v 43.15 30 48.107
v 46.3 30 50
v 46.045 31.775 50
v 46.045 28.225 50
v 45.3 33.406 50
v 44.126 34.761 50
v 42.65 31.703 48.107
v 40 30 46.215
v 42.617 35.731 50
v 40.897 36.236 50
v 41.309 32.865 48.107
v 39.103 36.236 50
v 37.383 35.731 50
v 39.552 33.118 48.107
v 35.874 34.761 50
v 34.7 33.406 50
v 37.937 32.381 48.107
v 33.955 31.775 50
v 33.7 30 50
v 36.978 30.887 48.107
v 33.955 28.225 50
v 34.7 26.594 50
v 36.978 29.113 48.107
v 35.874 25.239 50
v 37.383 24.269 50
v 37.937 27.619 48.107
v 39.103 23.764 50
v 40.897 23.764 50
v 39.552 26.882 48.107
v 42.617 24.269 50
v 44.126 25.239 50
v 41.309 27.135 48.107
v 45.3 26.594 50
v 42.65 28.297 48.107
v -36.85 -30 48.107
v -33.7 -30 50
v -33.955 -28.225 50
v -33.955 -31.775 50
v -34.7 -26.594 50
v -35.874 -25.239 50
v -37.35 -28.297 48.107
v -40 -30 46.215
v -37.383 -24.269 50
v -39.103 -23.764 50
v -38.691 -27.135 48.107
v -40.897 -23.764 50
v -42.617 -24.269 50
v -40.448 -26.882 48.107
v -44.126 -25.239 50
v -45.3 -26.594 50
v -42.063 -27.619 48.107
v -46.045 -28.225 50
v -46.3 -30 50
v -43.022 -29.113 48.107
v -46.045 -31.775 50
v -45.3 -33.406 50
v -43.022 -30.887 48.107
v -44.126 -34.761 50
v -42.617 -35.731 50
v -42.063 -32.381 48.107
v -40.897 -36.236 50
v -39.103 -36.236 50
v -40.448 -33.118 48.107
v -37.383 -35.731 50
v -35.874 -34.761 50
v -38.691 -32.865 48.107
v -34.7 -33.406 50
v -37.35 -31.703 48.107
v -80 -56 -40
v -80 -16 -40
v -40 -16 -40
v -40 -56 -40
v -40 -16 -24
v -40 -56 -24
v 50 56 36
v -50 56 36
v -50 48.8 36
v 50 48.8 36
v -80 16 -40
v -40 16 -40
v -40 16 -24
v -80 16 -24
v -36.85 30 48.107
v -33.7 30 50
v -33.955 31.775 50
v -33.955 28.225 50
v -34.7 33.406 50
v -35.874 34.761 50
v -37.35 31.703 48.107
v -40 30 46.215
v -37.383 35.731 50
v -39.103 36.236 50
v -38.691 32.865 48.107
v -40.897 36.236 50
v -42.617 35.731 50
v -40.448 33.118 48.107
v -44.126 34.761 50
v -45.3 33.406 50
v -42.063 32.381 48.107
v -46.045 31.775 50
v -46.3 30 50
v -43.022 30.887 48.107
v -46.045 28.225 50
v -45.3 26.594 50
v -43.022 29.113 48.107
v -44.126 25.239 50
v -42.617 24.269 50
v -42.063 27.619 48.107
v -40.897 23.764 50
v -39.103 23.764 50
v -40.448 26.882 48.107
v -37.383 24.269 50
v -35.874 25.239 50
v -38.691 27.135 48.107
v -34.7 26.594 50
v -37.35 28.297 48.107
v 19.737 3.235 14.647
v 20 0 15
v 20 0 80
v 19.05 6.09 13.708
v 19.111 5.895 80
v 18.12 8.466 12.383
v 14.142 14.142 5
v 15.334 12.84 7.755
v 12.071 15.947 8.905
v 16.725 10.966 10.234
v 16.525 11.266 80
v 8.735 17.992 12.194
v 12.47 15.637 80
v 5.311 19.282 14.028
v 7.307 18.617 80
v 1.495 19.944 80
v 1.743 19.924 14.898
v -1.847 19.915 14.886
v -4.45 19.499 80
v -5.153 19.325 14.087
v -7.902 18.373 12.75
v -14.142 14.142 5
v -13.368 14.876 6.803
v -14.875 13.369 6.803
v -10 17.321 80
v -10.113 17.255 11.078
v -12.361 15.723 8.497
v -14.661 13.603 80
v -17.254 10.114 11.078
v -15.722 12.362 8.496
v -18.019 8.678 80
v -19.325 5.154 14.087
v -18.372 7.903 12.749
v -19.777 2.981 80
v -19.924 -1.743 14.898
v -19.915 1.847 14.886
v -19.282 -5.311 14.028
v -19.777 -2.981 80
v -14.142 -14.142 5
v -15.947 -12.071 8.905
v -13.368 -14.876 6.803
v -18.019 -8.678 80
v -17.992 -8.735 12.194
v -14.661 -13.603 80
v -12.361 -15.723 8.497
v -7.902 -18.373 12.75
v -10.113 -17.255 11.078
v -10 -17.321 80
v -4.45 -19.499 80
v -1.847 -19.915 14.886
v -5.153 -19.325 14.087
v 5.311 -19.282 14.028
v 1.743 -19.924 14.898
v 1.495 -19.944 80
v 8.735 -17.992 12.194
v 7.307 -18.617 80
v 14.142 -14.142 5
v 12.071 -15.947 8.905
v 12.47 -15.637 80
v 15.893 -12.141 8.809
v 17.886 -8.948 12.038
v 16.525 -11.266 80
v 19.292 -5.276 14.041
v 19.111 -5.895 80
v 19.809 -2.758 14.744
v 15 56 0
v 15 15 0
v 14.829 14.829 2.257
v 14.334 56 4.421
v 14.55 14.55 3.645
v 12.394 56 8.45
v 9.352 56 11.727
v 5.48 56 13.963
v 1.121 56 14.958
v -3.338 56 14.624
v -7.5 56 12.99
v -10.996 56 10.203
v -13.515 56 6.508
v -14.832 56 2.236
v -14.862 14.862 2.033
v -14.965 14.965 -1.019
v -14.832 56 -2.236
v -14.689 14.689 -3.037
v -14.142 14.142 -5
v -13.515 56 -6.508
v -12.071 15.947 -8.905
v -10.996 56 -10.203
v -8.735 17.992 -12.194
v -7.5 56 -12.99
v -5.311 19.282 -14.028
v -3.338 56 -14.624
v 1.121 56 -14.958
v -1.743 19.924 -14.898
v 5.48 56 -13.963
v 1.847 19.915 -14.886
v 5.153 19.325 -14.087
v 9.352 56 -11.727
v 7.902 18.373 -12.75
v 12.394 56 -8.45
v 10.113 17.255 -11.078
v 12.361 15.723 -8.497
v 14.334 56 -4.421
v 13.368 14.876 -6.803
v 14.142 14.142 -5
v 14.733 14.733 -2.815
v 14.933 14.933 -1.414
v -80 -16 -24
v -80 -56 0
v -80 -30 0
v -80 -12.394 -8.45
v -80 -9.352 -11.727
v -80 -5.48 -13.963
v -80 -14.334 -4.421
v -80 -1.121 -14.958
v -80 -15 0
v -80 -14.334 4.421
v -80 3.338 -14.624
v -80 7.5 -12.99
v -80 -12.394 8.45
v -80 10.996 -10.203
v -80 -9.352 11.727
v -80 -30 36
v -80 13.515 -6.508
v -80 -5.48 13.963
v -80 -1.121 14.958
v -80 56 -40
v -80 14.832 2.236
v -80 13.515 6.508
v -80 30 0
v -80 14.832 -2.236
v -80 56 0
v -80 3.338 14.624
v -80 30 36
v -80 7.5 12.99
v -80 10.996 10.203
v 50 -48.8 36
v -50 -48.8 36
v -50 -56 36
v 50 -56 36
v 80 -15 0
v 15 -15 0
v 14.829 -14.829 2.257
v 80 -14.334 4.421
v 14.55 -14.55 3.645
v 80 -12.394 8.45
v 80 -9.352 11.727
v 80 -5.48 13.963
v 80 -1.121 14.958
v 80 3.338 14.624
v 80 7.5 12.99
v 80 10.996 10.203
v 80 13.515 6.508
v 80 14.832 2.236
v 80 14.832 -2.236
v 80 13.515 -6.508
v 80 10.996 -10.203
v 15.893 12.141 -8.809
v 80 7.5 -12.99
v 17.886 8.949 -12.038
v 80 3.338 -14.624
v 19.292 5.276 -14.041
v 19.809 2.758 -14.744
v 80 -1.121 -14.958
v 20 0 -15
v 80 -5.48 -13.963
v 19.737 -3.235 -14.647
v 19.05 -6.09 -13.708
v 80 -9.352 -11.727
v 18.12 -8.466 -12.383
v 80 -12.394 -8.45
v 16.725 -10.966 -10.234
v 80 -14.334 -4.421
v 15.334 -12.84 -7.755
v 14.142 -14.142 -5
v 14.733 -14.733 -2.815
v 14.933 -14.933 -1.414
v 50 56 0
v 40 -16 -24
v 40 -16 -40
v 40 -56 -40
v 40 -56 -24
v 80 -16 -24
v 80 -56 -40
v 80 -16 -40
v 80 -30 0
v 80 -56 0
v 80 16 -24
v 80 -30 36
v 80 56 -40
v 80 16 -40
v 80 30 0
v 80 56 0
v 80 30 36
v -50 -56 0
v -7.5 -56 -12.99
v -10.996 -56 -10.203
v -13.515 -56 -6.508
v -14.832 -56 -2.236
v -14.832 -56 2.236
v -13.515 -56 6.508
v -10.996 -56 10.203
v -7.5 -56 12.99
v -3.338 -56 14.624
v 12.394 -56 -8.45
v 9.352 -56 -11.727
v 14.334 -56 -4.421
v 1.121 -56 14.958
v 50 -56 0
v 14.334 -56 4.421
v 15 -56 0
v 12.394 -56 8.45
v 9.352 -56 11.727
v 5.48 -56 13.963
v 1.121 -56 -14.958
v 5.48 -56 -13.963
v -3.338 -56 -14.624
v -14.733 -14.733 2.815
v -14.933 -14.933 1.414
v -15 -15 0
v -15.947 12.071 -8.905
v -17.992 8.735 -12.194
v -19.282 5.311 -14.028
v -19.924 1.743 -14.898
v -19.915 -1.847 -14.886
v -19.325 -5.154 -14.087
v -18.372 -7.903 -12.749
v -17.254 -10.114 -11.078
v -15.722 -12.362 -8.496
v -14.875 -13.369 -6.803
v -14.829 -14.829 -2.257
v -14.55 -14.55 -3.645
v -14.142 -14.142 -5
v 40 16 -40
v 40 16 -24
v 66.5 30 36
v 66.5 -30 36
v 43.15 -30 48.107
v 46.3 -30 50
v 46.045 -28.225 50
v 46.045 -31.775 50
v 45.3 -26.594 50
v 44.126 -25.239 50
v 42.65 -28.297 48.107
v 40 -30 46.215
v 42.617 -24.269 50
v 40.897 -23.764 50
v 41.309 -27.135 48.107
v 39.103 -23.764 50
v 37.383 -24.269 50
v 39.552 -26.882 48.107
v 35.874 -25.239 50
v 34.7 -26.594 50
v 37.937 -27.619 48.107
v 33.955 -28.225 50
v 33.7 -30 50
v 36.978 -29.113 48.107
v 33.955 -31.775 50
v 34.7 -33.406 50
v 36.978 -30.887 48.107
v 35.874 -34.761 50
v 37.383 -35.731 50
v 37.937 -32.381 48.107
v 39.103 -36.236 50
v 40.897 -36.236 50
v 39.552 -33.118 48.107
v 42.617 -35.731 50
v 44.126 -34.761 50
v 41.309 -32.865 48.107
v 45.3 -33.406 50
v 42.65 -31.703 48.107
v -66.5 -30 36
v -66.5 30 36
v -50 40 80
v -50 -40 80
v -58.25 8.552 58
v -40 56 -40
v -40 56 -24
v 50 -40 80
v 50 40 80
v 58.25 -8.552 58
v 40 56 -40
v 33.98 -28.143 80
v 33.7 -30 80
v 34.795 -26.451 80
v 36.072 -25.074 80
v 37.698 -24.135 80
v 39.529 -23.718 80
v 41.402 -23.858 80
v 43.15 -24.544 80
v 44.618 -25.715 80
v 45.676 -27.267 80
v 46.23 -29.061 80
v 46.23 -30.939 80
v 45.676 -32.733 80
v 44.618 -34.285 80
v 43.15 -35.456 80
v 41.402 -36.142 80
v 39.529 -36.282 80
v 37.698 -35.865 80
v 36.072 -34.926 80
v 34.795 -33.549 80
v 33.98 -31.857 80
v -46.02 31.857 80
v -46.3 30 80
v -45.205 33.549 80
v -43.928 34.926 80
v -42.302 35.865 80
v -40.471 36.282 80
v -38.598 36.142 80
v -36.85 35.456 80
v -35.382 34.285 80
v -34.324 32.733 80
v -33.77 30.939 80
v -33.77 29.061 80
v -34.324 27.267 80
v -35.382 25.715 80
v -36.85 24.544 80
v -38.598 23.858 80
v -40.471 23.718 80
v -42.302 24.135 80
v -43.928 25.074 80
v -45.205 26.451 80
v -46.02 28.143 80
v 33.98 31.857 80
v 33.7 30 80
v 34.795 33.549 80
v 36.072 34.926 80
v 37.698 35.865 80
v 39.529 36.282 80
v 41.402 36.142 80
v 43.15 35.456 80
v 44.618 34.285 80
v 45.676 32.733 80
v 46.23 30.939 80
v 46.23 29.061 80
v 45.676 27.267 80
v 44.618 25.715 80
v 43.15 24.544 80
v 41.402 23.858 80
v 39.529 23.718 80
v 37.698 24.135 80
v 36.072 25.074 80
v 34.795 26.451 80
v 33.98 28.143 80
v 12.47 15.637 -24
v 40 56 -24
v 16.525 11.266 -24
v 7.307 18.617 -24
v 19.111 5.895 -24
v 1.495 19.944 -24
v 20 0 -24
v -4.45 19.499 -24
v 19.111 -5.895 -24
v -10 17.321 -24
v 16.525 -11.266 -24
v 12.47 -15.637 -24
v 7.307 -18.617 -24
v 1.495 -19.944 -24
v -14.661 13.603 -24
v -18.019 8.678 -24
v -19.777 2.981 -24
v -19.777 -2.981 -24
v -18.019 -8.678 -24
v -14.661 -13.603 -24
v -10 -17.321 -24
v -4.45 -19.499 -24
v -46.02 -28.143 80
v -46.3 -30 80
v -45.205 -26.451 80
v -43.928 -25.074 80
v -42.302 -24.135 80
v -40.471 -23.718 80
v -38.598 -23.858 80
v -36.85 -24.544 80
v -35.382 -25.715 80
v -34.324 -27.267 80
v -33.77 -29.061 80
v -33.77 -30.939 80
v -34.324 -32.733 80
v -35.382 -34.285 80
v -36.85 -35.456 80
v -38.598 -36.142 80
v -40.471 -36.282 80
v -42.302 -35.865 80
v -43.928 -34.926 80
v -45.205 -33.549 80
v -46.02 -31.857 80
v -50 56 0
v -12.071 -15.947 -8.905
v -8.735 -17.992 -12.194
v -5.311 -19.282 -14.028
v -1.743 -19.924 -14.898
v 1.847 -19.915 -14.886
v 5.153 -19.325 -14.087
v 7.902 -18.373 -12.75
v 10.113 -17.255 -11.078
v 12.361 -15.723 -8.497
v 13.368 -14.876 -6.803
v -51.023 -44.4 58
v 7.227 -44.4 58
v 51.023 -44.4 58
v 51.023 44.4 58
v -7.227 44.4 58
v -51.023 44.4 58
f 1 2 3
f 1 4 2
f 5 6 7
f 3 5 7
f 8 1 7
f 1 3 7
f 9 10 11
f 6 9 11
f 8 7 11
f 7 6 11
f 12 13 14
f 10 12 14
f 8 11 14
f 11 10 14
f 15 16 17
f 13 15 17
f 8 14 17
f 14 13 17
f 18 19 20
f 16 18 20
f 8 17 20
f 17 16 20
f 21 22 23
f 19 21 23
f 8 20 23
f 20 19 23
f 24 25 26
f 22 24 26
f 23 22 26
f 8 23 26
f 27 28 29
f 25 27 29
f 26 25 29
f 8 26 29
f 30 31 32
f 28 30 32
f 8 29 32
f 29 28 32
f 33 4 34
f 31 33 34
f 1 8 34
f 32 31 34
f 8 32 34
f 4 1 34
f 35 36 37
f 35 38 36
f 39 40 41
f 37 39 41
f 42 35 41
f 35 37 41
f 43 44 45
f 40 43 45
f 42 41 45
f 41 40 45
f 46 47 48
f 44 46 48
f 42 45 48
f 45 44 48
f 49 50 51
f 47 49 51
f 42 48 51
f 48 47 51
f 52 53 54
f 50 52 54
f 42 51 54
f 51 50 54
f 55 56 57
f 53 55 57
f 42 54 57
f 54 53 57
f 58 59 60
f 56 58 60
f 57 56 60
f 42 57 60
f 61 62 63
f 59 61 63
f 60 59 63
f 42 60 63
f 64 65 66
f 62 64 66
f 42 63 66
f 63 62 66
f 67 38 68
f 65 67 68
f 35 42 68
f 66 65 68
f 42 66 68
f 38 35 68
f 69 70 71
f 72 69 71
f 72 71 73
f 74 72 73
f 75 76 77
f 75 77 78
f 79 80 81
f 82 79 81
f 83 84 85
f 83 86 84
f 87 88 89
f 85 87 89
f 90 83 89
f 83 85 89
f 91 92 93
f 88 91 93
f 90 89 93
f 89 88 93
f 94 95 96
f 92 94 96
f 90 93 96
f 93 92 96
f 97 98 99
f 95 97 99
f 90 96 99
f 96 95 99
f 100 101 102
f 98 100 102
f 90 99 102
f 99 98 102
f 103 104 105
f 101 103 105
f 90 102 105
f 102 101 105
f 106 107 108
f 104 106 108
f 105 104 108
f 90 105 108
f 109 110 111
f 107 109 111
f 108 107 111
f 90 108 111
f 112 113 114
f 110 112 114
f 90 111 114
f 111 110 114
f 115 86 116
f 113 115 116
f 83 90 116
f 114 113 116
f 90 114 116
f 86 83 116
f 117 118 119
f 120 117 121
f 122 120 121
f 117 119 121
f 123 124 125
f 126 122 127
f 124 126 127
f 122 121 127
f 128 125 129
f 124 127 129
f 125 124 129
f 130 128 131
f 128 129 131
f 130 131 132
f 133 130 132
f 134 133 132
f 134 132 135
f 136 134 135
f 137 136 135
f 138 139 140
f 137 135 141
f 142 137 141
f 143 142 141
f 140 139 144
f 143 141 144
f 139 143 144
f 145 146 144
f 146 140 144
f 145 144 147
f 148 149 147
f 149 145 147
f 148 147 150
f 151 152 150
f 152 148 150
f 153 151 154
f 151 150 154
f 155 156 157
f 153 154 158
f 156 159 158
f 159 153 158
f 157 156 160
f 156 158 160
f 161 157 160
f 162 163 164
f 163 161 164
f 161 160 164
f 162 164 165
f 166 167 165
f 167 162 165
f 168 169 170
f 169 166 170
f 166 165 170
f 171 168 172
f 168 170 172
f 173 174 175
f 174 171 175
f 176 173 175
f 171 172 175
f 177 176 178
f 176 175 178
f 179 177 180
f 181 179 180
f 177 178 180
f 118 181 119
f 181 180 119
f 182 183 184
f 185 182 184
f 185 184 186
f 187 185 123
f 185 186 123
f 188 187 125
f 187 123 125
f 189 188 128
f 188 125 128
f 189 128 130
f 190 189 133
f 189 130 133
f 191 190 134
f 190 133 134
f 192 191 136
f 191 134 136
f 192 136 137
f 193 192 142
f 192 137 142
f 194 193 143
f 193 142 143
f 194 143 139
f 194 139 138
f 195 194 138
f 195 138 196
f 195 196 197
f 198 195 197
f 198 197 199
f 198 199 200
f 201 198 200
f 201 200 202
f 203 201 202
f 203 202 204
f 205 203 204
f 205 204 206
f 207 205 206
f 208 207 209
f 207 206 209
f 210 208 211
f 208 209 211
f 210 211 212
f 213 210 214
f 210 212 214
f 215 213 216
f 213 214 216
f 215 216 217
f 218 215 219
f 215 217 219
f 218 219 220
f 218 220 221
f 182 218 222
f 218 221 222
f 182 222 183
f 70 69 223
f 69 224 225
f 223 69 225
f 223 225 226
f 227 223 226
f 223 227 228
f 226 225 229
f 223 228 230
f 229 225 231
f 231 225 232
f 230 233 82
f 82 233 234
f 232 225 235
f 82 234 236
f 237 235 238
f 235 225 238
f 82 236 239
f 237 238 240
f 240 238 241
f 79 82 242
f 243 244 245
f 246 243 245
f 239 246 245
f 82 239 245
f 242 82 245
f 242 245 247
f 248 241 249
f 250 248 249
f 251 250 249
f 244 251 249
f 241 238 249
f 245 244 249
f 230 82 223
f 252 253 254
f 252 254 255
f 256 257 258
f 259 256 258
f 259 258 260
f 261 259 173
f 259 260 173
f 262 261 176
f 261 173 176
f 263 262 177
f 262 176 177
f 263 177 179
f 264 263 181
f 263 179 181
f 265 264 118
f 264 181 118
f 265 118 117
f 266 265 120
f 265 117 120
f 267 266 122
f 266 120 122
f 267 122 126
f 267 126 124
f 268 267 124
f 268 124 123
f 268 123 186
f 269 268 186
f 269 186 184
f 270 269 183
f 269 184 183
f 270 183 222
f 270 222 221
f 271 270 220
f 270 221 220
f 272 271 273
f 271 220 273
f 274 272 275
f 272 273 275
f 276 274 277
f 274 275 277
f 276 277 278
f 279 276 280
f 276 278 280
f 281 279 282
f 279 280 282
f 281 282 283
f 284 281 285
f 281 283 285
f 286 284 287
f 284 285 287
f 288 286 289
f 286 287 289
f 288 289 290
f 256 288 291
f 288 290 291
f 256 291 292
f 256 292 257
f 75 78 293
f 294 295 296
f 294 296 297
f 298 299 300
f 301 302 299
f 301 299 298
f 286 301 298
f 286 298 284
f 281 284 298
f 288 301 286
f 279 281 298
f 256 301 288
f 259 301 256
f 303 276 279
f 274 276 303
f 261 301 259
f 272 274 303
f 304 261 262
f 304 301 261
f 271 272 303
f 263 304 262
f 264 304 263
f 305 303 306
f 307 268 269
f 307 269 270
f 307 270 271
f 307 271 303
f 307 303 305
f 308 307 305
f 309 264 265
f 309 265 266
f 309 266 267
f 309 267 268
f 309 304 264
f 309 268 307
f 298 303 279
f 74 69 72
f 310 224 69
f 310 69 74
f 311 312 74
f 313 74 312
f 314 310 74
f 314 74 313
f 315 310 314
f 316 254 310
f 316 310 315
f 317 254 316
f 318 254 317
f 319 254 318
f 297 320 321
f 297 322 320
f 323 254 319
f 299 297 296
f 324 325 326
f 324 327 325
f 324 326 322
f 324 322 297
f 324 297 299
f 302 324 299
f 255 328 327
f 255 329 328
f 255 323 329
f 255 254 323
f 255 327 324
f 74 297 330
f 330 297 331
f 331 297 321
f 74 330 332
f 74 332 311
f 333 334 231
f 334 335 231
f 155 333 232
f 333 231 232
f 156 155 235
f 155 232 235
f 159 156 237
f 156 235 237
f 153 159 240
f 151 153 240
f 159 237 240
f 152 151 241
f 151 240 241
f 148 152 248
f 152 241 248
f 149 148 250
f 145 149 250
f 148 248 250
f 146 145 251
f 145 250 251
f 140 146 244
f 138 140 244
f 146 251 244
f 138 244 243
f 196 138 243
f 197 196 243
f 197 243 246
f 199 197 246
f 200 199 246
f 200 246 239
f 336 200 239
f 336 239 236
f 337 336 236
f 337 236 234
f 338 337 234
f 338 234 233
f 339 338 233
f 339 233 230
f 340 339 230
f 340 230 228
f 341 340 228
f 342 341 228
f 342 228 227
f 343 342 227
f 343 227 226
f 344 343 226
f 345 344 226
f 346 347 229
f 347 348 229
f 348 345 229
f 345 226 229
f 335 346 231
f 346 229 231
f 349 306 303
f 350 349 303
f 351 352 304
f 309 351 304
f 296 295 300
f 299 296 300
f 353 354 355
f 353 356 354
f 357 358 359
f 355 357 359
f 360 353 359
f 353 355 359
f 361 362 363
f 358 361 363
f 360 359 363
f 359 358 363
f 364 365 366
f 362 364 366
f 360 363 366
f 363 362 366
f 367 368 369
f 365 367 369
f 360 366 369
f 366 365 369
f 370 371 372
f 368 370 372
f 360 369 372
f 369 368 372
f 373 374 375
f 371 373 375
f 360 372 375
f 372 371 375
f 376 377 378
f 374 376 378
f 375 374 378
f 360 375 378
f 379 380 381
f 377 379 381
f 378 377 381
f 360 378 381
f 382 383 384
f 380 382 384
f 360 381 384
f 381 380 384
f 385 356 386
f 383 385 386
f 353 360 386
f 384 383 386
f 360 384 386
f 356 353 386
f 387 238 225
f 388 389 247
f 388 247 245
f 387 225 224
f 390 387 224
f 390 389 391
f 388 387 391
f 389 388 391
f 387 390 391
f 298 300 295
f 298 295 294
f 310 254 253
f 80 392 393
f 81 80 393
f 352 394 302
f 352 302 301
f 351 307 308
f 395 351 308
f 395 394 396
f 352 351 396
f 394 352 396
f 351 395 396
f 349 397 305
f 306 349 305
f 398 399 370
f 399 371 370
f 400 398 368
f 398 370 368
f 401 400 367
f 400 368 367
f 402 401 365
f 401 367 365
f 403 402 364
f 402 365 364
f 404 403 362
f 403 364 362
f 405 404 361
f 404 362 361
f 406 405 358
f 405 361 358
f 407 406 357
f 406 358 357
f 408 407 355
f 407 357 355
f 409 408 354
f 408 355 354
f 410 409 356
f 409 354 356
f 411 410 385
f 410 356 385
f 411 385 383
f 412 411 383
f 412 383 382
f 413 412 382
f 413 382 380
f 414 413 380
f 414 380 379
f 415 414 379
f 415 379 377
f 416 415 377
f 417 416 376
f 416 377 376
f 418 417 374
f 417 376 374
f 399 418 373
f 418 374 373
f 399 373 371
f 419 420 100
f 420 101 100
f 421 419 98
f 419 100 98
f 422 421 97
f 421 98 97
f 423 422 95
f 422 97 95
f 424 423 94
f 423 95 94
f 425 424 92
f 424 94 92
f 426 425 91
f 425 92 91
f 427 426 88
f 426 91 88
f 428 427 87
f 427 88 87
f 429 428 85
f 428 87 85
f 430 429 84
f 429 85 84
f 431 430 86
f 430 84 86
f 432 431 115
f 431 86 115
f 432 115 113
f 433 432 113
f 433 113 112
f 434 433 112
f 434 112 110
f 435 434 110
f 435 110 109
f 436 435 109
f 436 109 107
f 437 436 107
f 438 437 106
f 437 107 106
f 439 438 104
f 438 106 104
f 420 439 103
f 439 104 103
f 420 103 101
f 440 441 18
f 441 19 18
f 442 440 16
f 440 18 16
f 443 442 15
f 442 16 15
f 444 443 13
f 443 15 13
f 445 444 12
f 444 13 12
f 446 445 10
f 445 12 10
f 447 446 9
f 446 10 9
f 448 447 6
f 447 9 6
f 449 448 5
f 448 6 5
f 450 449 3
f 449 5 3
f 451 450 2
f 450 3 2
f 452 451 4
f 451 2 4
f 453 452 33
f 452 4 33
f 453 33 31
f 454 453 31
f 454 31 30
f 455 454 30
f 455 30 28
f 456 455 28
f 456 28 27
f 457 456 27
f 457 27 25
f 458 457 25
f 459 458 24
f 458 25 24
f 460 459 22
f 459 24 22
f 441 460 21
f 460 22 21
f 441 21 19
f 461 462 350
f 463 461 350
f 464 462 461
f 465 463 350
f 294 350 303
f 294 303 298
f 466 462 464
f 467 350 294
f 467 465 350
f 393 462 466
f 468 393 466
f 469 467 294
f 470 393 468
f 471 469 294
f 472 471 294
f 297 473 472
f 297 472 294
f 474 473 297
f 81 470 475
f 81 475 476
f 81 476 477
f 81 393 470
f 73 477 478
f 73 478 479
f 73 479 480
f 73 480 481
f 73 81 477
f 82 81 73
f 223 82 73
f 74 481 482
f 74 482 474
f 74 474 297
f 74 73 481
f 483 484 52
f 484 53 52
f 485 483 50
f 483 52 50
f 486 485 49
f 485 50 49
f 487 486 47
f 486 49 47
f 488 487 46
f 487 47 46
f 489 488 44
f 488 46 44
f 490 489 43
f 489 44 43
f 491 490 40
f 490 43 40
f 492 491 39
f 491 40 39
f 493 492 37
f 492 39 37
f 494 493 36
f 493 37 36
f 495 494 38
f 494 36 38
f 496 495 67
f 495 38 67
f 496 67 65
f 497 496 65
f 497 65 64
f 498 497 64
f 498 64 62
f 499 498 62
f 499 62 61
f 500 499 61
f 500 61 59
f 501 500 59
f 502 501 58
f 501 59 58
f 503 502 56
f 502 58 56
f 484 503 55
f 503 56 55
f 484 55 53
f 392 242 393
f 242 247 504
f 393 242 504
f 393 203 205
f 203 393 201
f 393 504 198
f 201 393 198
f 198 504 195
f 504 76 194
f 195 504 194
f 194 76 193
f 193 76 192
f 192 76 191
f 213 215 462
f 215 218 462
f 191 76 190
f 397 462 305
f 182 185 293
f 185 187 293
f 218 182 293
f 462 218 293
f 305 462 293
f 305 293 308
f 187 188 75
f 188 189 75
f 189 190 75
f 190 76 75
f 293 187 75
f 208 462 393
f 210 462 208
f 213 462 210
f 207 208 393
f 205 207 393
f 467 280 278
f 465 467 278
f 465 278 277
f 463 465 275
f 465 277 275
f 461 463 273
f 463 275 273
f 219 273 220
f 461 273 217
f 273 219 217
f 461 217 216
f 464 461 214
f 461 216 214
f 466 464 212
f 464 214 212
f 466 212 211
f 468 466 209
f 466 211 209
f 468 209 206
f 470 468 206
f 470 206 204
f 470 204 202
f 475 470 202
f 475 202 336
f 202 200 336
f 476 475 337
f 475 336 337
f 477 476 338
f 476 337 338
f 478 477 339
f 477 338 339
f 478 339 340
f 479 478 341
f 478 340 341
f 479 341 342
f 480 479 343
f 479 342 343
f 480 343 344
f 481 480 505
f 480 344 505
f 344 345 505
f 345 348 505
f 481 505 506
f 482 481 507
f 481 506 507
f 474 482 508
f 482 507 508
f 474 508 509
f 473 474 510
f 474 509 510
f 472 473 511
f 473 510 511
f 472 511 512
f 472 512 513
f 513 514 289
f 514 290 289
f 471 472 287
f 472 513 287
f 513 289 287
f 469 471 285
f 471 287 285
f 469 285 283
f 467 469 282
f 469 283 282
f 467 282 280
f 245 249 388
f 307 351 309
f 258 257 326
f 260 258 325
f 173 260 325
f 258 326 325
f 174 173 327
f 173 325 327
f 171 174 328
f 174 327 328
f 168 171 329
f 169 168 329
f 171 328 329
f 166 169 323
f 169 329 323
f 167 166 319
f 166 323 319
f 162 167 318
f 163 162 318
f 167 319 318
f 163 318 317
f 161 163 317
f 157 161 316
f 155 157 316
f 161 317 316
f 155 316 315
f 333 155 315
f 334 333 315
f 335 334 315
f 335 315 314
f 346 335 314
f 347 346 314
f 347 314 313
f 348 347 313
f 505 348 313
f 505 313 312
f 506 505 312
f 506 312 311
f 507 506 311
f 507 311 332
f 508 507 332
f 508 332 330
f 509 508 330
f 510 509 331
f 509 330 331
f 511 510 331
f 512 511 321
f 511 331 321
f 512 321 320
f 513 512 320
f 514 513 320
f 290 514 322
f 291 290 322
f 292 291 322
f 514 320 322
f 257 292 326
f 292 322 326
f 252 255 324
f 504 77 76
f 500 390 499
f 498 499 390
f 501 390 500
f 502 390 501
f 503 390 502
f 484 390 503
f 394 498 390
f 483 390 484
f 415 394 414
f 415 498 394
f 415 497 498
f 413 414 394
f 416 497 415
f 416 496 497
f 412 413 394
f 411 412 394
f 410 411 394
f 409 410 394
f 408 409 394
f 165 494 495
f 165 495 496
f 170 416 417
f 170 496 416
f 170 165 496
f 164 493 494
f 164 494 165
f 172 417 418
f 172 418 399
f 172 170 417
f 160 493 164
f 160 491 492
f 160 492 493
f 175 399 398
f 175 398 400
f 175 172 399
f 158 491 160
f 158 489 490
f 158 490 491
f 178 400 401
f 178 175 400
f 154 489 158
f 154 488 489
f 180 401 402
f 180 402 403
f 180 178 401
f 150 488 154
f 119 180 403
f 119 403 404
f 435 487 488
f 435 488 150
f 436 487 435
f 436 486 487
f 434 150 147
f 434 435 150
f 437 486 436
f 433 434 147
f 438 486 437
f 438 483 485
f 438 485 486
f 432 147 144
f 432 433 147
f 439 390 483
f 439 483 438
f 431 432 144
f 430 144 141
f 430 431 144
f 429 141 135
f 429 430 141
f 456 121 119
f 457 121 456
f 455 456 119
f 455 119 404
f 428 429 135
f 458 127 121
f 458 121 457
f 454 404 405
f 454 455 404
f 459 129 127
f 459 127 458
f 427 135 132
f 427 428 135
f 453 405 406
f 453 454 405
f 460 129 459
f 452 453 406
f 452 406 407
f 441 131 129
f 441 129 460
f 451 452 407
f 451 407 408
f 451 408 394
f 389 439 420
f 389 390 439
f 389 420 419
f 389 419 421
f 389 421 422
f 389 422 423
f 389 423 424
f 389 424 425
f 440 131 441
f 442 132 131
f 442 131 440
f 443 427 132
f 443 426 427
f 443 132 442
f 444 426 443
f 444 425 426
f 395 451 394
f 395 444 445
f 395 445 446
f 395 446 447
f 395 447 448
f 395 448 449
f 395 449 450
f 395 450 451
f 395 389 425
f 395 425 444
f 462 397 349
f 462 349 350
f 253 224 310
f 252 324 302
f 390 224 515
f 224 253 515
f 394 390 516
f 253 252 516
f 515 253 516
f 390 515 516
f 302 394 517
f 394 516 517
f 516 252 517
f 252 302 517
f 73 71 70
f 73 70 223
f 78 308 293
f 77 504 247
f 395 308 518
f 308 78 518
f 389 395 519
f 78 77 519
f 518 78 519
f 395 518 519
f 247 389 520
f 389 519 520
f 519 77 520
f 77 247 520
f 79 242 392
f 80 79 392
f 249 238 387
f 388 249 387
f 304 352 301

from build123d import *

# Parameters (mm, degrees)
F0_W      = 160
F0_H      = 112
F1_DEPTH  = 40
F2_W      = 80
F2_H      = 16
F3_DEPTH  = 115
F4_W      = 32
F4_H      = 16
F5_DEPTH  = 165
F6_W      = 100
F6_H      = 112
F7_DEPTH  = 36
F8_W      = 30
F8_H      = 60
F9_DEPTH  = 36
F10_W     = 30
F10_H     = 60
F11_DEPTH = 36
F14_W     = 100
F14_H     = 80
F12_W     = 160
F12_H     = 112
F16_R     = 20
F17_DEPTH = 120
F18_R     = 15
F19_DEPTH = 112
F20_R     = 15
F21_DEPTH = 160
F23_D     = 12.6
F23_DEPTH = 30
F23_TIP   = 3.7854218999


with BuildPart() as f1:
    # F0 (on Top) → F1 (new body)
    with BuildSketch(Plane.XY):
        Rectangle(F0_W, F0_H)
    extrude(amount=-F1_DEPTH)

    # F2 (on face) → F3 (cut)
    with BuildSketch(Plane.XZ.offset(56)):
        with Locations((0, -32)):
            Rectangle(F2_W, F2_H)
    extrude(amount=-F3_DEPTH, mode=Mode.SUBTRACT)

    # F4 (on face) → F5 (cut)
    with BuildSketch(Plane(origin=(-80, 0, 0), x_dir=(0, -1, 0), z_dir=(-1, 0, 0))):
        with Locations((0, -32)):
            Rectangle(F4_W, F4_H)
    extrude(amount=-F5_DEPTH, mode=Mode.SUBTRACT)

    # F6 (on face) → F7 (join)
    with BuildSketch(Plane.XY):
        Rectangle(F6_W, F6_H)
    extrude(amount=F7_DEPTH)

    # F8 (on face) → F9 (join)
    with BuildSketch(Plane.XY):
        with Locations((65, 0)):
            Rectangle(F8_W, F8_H)
    extrude(amount=F9_DEPTH)

    # F10 (on face) → F11 (join)
    with BuildSketch(Plane.XY):
        with Locations((-65, 0)):
            Rectangle(F10_W, F10_H)
    extrude(amount=F11_DEPTH)

    # F14 (on offset) → F15 section 0
    with BuildSketch(Plane.XY.offset(80)):
        Rectangle(F14_W, F14_H)
    # F12 (on Top) → F15 section 1
    with BuildSketch(Plane.XY):
        Rectangle(F12_W, F12_H)
    loft()

    # F16 (on face) → F17 (cut)
    with BuildSketch(Plane.XY.offset(80)):
        Circle(F16_R)
    extrude(amount=-F17_DEPTH, mode=Mode.SUBTRACT)

    # F18 (on face) → F19 (cut)
    with BuildSketch(Plane.XZ.offset(56)):
        Circle(F18_R)
    extrude(amount=-F19_DEPTH, mode=Mode.SUBTRACT)

    # F20 (on face) → F21 (cut)
    with BuildSketch(Plane(origin=(-80, 0, 0), x_dir=(0, -1, 0), z_dir=(-1, 0, 0))):
        Circle(F20_R)
    extrude(amount=-F21_DEPTH, mode=Mode.SUBTRACT)

    # F23
    with Locations(Plane.XY.offset(80)):
        with Locations((-40, 30), (40, 30), (40, -30), (-40, -30)):
            Hole(F23_D / 2, depth=F23_DEPTH)
            with Locations((0, 0, -(F23_DEPTH + F23_TIP / 2))):  # 118° drill point
                Cone(0, F23_D / 2, F23_TIP, mode=Mode.SUBTRACT)


solid = f1.part
